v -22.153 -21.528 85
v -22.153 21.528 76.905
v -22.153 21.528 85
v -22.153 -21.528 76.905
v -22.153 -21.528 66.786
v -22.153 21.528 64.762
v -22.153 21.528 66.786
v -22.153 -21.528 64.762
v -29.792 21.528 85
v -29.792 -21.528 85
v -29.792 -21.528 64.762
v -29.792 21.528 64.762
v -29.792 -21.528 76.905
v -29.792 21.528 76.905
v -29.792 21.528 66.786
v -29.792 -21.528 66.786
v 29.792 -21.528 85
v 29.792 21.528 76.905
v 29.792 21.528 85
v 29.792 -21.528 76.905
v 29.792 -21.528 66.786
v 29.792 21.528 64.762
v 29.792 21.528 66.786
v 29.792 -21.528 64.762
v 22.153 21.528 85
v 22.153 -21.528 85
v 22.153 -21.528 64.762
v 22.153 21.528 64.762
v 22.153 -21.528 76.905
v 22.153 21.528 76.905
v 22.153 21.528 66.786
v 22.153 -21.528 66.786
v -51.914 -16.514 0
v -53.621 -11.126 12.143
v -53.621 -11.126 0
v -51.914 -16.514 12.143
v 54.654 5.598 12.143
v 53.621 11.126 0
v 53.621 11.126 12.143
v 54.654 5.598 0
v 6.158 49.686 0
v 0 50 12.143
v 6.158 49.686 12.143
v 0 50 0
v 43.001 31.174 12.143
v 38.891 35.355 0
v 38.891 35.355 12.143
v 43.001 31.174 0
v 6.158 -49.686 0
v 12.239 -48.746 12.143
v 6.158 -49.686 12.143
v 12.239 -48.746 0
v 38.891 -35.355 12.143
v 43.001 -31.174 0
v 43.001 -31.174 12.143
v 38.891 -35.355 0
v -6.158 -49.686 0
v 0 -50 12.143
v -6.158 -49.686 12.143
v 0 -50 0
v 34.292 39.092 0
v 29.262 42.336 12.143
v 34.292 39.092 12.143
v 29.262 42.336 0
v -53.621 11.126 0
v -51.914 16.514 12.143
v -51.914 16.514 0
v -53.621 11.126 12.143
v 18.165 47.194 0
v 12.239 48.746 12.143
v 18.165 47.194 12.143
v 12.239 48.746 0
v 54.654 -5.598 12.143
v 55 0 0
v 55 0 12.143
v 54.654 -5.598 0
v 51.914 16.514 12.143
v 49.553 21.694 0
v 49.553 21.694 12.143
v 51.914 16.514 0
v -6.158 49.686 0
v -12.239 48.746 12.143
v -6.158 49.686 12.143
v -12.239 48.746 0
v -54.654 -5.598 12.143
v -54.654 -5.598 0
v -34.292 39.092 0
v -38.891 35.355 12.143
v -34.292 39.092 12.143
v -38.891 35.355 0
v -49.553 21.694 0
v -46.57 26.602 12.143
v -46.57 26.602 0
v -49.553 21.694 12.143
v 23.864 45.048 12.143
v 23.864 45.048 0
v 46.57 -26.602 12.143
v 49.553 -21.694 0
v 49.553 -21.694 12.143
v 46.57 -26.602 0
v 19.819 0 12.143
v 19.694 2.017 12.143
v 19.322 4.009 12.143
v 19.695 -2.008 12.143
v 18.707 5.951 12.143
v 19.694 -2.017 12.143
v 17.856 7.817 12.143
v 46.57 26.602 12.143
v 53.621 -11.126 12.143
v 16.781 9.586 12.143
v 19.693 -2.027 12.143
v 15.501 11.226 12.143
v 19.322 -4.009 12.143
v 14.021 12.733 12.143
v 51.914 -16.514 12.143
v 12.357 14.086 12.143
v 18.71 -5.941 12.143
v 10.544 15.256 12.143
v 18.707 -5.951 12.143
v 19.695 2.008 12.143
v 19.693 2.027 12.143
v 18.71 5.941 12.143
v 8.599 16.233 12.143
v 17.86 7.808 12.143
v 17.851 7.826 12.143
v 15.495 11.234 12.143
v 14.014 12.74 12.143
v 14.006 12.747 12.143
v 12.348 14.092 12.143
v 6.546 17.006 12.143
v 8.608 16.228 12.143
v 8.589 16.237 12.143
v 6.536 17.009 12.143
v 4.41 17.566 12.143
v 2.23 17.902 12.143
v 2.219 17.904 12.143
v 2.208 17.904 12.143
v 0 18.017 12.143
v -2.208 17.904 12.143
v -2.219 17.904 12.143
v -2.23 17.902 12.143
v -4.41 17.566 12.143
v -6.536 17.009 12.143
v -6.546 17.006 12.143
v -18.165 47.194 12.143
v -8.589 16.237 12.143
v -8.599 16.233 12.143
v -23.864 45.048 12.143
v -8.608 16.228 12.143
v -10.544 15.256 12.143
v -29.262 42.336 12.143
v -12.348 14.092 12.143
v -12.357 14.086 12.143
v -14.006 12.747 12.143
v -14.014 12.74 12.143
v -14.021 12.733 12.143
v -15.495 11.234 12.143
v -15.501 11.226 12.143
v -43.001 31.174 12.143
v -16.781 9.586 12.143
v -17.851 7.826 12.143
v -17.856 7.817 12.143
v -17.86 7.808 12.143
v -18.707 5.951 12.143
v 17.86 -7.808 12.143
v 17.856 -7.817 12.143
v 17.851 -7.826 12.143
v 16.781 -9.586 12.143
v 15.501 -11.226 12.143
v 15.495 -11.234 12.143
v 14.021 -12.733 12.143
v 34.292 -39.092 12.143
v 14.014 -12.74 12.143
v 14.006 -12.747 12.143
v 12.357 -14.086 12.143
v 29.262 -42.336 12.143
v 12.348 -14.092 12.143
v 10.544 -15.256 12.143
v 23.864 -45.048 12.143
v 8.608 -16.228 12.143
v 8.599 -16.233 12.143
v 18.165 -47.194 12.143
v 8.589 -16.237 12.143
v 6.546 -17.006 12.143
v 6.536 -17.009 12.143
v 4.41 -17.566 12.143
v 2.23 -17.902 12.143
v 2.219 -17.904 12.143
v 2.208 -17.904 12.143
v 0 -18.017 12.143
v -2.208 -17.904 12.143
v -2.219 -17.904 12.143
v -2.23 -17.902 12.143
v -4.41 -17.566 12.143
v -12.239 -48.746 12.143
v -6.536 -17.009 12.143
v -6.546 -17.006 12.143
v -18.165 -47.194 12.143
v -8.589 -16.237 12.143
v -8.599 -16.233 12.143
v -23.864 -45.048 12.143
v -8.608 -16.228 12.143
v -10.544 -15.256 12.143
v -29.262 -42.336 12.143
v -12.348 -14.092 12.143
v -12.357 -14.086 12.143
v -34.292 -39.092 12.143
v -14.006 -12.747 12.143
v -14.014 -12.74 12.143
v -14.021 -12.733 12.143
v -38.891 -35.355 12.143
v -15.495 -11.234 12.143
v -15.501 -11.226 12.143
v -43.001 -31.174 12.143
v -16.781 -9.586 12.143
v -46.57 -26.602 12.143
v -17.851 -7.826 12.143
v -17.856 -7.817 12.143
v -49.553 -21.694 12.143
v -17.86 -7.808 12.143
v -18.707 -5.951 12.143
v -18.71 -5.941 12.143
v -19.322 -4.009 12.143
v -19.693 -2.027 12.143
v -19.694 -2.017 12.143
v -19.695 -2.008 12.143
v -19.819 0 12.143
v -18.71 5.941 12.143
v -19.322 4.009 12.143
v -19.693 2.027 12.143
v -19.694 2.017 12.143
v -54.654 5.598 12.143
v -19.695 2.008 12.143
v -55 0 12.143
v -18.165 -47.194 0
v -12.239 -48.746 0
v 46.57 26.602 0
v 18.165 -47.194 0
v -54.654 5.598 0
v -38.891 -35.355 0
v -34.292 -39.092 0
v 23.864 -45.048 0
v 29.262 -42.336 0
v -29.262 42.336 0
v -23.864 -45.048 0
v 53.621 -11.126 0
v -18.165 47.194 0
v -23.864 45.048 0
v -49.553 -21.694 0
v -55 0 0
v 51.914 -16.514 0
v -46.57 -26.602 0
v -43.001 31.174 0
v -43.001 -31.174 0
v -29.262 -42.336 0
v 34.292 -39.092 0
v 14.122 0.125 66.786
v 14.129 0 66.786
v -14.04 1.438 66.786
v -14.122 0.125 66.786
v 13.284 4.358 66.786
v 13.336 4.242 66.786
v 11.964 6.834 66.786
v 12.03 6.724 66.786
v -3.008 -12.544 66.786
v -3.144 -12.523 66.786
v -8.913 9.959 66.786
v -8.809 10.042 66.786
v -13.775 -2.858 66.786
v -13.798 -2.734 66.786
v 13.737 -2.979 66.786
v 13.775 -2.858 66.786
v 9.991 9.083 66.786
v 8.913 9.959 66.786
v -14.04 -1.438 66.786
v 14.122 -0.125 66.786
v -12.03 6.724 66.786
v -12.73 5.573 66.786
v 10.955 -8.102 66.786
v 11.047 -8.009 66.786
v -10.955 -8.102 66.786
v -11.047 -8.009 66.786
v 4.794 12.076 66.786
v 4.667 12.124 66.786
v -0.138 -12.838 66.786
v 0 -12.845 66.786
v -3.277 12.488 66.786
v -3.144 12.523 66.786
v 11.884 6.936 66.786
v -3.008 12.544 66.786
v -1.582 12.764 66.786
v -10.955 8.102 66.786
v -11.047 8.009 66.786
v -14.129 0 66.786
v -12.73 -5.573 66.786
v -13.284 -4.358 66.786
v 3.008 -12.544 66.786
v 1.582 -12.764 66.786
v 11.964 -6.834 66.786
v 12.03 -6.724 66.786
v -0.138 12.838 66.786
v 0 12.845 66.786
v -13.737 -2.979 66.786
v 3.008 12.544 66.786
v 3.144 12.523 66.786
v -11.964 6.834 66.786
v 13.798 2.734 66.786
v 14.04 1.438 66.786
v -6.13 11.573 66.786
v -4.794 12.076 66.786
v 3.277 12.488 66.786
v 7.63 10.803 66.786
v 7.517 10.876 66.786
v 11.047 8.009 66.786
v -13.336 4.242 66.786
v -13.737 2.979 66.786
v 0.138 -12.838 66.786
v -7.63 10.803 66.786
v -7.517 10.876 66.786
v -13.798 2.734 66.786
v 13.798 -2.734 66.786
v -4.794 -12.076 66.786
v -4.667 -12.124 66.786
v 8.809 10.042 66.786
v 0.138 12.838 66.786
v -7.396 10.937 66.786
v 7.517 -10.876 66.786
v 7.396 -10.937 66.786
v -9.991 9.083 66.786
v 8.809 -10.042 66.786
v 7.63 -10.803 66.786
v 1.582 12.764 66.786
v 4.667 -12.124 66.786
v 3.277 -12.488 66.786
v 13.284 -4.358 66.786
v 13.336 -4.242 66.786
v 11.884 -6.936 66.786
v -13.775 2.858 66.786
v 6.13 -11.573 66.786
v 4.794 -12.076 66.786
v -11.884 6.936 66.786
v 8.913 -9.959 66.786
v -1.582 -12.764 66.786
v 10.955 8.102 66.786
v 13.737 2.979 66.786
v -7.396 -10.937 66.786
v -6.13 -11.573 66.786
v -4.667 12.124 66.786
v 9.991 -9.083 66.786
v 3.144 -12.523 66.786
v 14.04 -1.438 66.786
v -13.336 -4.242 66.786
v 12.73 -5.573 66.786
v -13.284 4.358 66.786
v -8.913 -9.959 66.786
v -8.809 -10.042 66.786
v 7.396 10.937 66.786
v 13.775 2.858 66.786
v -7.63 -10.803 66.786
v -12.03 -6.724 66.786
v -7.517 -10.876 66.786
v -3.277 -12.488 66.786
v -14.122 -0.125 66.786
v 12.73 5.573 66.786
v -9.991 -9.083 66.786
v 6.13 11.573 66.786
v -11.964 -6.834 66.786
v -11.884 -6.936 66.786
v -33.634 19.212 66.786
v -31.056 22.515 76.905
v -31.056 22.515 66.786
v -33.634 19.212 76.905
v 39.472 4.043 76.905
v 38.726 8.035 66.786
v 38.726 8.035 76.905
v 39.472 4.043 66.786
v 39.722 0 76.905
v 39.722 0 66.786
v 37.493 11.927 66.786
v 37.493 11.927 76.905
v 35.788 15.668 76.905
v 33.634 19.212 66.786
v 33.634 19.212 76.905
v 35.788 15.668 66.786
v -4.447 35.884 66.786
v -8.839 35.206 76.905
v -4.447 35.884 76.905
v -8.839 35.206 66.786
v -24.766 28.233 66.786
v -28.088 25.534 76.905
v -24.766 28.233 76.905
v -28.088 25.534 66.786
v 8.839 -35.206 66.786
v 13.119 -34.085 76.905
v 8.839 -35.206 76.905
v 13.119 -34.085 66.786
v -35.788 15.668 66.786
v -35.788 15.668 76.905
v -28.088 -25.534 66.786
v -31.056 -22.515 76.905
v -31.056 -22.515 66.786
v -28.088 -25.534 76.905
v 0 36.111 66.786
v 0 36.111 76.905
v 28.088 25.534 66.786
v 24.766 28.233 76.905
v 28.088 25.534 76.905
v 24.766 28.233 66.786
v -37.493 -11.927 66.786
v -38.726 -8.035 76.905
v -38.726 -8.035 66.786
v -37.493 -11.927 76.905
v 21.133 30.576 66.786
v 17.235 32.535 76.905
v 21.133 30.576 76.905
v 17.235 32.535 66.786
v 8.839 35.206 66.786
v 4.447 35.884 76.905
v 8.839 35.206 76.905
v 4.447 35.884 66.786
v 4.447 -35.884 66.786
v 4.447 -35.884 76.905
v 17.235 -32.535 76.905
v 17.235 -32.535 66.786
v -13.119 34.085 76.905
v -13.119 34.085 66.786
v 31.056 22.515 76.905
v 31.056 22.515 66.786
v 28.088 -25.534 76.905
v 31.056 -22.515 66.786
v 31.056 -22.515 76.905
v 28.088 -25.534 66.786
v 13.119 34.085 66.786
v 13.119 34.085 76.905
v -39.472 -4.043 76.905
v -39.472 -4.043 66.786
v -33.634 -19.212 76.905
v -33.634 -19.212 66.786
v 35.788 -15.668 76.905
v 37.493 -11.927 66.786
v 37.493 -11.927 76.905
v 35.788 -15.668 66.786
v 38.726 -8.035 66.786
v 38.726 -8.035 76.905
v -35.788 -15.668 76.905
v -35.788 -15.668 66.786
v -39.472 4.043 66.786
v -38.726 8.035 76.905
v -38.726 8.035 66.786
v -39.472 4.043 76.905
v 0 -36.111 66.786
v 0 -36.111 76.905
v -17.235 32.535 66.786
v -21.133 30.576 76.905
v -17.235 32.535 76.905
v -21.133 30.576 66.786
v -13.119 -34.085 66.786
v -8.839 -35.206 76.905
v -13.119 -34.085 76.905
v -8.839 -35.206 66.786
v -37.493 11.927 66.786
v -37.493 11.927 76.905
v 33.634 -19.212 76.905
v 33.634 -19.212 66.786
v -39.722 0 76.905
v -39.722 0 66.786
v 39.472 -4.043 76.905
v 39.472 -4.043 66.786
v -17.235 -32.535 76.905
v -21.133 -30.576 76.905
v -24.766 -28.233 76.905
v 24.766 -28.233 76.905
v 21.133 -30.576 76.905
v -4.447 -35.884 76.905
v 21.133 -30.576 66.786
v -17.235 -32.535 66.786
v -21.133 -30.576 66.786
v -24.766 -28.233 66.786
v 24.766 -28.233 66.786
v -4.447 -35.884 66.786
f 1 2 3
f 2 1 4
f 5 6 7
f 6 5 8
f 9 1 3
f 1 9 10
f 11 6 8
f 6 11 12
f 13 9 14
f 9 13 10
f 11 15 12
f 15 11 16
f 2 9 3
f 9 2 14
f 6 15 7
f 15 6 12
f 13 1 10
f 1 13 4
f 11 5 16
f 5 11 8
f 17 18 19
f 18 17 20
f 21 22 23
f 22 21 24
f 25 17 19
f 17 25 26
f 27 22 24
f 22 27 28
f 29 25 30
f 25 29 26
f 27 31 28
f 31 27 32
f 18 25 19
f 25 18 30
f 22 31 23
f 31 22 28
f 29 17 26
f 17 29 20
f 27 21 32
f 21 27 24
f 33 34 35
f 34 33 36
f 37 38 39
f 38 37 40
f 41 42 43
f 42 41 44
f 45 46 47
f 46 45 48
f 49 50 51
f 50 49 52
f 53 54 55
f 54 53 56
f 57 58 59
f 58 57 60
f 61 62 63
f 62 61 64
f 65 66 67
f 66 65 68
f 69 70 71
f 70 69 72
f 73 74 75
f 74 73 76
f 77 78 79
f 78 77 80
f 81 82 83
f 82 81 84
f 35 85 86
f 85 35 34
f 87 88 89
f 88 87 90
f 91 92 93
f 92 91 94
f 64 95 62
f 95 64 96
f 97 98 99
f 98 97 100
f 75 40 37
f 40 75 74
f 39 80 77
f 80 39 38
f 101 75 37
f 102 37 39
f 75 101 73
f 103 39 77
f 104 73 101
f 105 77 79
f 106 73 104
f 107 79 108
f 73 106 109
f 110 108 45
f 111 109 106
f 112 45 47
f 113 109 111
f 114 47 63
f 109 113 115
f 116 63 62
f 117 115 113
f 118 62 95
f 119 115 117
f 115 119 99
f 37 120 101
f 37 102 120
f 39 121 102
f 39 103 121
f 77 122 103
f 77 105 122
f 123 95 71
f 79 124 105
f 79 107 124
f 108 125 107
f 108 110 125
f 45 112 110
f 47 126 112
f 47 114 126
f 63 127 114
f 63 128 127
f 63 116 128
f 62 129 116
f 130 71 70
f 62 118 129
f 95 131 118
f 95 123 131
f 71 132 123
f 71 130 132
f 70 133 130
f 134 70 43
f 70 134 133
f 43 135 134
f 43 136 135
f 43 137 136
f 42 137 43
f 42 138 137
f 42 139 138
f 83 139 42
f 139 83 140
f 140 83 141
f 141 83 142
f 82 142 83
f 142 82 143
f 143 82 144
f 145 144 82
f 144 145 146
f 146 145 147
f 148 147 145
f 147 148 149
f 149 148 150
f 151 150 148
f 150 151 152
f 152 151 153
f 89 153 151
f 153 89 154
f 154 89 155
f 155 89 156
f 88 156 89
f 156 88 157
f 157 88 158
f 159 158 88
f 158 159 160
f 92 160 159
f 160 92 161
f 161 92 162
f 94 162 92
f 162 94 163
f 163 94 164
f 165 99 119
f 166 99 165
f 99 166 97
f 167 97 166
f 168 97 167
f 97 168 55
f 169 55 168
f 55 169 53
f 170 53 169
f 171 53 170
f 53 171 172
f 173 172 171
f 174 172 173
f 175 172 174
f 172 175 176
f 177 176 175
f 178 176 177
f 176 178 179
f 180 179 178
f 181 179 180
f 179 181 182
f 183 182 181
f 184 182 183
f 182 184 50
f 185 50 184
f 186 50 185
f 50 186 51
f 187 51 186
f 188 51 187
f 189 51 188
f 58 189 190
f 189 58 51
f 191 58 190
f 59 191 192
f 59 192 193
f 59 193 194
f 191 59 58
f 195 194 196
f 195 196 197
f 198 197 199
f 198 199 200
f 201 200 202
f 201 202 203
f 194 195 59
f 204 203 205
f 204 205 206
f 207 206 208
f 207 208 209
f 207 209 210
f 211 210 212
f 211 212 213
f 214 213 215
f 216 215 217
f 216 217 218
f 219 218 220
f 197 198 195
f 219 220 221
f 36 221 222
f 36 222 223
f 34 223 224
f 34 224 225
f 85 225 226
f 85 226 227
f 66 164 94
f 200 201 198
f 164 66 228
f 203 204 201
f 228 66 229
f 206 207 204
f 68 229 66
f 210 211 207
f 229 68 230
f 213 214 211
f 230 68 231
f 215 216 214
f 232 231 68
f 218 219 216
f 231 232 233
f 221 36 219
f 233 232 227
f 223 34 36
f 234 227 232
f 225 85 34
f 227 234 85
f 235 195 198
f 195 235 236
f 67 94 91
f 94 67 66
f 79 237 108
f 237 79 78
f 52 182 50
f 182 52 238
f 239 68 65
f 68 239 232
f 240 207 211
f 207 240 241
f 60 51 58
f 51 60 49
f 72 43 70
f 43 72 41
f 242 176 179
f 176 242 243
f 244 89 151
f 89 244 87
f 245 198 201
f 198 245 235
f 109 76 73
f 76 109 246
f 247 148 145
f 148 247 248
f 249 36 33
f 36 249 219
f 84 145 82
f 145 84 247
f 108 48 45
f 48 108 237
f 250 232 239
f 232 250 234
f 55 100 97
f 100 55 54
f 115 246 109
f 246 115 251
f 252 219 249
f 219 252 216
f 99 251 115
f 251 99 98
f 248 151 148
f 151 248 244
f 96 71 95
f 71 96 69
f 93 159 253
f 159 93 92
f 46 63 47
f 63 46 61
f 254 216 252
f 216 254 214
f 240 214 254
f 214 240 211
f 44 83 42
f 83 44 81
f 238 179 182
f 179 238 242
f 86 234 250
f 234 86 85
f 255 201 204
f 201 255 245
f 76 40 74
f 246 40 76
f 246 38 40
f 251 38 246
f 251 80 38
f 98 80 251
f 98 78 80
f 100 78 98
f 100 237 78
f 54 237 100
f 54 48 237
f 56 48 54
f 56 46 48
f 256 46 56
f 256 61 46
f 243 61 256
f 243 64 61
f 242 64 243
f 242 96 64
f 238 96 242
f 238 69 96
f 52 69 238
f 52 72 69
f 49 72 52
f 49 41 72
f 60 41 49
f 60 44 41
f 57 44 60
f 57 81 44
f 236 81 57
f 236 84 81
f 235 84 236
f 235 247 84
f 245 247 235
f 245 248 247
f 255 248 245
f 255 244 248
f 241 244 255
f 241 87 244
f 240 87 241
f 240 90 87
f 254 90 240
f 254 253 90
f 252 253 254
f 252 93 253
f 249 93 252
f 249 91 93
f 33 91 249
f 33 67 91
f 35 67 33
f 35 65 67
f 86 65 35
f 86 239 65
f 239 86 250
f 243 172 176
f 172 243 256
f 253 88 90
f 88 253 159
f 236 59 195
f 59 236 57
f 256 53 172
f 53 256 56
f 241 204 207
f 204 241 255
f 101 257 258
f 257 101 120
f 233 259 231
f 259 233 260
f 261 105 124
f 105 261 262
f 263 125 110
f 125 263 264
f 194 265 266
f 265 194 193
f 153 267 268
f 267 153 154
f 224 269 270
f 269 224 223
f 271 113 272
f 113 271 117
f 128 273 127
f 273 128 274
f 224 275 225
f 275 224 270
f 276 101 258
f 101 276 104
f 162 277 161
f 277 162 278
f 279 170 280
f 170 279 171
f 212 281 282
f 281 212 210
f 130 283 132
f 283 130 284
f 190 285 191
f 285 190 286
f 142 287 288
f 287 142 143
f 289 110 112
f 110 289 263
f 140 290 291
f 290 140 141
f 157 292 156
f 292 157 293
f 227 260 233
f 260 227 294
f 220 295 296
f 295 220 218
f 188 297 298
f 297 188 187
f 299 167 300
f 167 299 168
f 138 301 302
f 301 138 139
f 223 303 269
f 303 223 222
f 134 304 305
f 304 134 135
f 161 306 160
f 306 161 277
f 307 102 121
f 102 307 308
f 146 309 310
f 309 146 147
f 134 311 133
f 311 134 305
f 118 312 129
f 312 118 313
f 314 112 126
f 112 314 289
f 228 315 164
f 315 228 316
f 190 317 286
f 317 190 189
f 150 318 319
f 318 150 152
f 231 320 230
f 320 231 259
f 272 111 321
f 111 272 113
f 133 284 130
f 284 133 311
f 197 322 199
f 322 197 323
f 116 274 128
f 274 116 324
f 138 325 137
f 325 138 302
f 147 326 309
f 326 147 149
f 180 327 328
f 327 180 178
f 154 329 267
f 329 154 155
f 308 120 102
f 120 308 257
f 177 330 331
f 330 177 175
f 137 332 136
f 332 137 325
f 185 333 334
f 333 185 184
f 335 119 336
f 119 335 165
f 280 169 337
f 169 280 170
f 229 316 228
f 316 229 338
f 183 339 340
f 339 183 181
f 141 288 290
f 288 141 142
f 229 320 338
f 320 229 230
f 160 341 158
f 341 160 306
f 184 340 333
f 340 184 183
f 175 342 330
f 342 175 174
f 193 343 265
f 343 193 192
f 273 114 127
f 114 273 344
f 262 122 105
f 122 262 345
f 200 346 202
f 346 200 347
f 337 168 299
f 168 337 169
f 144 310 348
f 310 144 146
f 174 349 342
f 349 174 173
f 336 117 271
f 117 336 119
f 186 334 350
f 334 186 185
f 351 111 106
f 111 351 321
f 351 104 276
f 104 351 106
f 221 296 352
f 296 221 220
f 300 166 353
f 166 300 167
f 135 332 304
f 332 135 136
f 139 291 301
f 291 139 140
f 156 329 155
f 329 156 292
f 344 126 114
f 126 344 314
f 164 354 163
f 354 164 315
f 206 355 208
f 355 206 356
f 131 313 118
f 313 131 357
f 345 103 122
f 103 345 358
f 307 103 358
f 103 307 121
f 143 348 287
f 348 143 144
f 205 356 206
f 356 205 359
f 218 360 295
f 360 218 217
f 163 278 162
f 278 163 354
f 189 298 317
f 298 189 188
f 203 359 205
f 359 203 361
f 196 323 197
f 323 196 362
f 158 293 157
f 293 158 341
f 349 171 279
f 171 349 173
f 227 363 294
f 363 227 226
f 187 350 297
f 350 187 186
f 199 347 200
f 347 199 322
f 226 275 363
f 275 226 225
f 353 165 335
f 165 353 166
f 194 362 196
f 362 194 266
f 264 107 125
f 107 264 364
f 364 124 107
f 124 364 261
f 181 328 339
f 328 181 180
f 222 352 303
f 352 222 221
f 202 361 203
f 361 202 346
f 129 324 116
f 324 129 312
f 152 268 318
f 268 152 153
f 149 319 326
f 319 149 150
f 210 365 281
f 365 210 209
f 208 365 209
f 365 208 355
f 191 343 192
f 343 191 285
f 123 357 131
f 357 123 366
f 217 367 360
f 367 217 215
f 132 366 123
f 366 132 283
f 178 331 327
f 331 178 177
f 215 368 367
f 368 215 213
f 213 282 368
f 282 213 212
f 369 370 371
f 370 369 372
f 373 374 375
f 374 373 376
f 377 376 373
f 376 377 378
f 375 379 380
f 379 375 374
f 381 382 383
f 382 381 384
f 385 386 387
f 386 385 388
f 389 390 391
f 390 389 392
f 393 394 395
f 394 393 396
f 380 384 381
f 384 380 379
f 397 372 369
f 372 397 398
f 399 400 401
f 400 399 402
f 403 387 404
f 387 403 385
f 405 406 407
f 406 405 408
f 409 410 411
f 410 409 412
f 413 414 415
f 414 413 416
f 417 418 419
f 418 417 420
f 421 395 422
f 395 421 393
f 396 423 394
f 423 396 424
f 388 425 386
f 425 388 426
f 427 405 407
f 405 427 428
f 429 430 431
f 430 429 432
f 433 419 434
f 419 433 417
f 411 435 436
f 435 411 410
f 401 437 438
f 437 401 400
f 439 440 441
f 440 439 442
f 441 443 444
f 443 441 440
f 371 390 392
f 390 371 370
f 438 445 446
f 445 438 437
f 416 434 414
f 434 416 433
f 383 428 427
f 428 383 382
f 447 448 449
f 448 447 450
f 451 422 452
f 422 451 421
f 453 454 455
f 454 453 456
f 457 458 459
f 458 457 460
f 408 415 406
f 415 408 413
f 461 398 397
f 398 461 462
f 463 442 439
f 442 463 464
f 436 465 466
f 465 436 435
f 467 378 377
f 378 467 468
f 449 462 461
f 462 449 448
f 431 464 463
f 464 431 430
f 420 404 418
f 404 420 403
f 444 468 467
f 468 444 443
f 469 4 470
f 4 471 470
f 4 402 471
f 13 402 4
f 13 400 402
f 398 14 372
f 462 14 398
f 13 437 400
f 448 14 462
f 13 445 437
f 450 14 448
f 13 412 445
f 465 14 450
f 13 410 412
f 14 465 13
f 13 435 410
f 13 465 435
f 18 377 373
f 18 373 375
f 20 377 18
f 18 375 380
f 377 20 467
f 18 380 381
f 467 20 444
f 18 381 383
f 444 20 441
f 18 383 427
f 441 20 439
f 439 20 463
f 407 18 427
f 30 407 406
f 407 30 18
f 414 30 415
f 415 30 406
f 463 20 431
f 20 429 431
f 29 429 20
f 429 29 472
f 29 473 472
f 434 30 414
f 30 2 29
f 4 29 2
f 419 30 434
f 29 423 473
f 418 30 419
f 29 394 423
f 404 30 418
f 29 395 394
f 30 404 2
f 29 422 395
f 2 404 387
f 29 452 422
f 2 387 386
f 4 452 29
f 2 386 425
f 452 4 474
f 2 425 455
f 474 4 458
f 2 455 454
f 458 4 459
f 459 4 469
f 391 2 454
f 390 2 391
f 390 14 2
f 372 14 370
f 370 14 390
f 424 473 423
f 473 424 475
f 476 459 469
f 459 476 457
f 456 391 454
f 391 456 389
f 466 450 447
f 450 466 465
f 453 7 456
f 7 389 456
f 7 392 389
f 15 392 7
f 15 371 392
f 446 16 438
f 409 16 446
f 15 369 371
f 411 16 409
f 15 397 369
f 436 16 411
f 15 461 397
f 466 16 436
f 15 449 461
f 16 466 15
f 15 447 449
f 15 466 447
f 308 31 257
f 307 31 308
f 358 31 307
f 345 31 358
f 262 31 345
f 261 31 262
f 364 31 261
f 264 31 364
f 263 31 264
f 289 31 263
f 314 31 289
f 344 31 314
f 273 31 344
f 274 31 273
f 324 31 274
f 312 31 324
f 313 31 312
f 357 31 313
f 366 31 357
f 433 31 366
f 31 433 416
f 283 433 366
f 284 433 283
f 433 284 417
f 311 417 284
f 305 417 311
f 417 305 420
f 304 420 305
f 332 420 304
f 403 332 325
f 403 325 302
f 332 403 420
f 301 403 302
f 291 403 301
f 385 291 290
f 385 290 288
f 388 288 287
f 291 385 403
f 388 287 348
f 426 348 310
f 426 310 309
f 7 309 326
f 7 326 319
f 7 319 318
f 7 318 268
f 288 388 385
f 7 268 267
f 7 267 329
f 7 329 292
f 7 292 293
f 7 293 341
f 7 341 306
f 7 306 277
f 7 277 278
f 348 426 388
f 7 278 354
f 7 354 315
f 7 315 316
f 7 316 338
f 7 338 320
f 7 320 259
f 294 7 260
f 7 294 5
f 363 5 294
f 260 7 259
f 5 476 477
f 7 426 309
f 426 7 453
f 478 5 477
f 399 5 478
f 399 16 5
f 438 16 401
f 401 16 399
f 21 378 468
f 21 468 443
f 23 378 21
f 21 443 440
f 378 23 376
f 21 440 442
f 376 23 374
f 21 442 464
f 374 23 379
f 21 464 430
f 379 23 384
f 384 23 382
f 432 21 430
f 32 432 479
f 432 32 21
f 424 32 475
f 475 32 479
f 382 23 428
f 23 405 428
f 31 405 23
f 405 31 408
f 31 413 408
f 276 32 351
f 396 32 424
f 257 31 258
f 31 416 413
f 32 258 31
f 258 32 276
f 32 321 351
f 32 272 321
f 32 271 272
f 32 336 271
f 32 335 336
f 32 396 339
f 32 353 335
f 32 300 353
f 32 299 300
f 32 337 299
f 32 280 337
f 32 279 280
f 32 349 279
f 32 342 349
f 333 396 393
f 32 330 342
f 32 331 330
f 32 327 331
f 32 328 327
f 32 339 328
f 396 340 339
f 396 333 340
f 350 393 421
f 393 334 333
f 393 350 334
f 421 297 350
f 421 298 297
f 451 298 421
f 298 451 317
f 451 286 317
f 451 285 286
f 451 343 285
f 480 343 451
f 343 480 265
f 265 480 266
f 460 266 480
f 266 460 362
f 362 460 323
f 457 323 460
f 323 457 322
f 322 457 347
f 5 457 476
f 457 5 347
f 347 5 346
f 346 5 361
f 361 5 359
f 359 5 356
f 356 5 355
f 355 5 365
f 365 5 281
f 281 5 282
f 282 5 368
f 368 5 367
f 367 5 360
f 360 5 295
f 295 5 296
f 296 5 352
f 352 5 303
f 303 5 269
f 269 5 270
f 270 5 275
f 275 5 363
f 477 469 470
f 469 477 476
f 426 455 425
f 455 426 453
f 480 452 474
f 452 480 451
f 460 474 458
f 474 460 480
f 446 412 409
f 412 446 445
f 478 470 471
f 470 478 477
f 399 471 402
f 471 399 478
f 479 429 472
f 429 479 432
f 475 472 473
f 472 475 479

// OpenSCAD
// Collectible Display Plinth | 收藏品展示底座 | original parametric CAD prototype
// CAD uses millimeters/Z-up; target dimensions [width,depth,height] mm.
// Product hypothesis only; full slicer/manifold and real-print checks required.
use <lib/commerce_forms.scad>
resize([110,100,85],auto=false)
    commercial_form(family="display",variant=1);
